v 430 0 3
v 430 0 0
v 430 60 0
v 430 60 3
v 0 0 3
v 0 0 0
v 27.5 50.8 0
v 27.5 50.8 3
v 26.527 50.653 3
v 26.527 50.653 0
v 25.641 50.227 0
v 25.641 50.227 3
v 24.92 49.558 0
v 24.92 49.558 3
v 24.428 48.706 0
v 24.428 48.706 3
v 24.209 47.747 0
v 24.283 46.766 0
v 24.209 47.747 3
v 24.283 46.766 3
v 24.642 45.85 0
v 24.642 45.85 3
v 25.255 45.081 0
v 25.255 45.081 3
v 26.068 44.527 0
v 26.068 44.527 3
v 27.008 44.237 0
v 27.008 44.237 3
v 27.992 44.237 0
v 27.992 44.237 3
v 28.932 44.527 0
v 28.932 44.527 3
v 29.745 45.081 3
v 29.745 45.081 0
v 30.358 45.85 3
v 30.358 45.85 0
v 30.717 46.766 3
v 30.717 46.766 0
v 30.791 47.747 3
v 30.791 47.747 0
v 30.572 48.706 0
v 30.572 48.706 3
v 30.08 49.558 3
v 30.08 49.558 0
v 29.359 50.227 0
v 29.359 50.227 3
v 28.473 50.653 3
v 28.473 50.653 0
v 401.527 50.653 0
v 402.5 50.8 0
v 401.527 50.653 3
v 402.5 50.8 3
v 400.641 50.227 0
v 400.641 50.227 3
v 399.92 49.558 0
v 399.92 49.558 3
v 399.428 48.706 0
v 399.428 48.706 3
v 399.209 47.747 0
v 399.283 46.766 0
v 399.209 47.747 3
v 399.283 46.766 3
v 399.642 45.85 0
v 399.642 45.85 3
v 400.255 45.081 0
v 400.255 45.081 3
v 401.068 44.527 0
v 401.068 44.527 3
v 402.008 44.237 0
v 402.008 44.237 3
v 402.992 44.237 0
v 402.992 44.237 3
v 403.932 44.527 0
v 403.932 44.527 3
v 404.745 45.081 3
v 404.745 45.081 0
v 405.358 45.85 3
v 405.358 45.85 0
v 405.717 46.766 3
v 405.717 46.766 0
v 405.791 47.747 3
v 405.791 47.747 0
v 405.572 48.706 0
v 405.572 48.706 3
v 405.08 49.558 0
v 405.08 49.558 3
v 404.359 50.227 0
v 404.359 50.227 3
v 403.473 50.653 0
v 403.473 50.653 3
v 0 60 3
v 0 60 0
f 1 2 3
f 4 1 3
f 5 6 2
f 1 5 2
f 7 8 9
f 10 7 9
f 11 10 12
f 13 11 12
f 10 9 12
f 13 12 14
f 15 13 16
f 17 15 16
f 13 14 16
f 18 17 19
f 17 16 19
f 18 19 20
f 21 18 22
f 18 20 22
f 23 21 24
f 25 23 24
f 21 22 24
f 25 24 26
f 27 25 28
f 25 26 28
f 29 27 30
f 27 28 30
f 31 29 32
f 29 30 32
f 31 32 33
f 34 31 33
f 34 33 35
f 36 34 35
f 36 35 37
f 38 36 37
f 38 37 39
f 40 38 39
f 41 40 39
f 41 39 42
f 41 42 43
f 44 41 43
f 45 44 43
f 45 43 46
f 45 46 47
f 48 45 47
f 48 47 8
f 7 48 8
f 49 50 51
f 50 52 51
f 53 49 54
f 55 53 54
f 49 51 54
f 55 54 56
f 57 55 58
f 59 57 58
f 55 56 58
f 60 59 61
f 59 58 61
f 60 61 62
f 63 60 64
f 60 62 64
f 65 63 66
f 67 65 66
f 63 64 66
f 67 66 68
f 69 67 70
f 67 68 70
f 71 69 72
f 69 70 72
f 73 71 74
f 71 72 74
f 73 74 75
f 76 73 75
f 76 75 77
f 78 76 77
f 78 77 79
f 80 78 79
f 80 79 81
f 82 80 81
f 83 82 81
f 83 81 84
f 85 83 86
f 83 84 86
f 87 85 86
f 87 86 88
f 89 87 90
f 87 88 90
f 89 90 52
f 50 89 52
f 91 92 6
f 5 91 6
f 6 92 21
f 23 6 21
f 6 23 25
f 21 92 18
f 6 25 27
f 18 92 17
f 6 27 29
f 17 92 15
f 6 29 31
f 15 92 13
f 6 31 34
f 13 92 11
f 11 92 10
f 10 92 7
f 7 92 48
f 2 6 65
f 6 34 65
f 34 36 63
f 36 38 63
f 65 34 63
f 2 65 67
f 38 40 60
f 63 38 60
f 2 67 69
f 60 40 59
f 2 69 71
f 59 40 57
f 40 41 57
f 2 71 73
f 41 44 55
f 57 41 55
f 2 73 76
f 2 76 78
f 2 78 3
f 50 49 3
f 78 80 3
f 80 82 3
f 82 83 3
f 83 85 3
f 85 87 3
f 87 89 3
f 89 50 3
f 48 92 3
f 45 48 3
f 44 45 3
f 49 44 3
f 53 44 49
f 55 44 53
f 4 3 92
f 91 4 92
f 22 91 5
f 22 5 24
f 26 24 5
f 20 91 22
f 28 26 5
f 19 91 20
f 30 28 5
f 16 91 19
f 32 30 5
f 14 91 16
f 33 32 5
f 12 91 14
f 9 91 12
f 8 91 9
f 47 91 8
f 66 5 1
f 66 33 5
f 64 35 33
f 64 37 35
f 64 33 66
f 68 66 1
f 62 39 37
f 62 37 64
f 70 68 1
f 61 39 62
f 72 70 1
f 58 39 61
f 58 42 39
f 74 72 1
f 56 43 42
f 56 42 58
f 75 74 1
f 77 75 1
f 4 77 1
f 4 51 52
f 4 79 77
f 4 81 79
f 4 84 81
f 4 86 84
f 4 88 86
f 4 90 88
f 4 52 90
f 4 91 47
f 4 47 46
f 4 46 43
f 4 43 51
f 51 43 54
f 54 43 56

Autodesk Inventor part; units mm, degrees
ref_plane "YZ Plane" through (0, 0, 0) normal (1, 0, 0) x (0, 1, 0)
ref_plane "XZ Plane" through (0, 0, 0) normal (0, 1, 0) x (-1, 0, 0)
ref_plane "XY Plane" through (0, 0, 0) normal (0, 0, 1) x (1, 0, 0)
sketch "Sketch1" plane through (0, 0, 0) normal (0, 0, 1) x (1, 0, 0)
  line L0 (0, 0) -> (430, 0)
  line L1 (430, 0) -> (430, 60)
  line L2 (430, 60) -> (0, 60)
  line L3 (0, 60) -> (0, 0)
  line L4 (215, 44.8722) -> (215, 13.4403) construction
  point P0 (27.5, 47.5)
  point P1 (402.5, 47.5)
  point P2 (0, 30)
  dimension "d0" = 430
  dimension "d1" = 60
  dimension "d4" = 375
  dimension "d9" = 215
  dimension "d10" = 12.5
extrude "Extrusion1" add sketch "Sketch1" along normal blind 3
hole "Hole1" at (27.5, 47.5, 0) at (402.5, 47.5, 0) direction (0, 0, 1) diameter 6.6 end through all clearance for "Flat Head Machine Screw" size "M6" standard "Ansi Metric M Profile"
properties part number "light-trap-panel-bottom-front"
